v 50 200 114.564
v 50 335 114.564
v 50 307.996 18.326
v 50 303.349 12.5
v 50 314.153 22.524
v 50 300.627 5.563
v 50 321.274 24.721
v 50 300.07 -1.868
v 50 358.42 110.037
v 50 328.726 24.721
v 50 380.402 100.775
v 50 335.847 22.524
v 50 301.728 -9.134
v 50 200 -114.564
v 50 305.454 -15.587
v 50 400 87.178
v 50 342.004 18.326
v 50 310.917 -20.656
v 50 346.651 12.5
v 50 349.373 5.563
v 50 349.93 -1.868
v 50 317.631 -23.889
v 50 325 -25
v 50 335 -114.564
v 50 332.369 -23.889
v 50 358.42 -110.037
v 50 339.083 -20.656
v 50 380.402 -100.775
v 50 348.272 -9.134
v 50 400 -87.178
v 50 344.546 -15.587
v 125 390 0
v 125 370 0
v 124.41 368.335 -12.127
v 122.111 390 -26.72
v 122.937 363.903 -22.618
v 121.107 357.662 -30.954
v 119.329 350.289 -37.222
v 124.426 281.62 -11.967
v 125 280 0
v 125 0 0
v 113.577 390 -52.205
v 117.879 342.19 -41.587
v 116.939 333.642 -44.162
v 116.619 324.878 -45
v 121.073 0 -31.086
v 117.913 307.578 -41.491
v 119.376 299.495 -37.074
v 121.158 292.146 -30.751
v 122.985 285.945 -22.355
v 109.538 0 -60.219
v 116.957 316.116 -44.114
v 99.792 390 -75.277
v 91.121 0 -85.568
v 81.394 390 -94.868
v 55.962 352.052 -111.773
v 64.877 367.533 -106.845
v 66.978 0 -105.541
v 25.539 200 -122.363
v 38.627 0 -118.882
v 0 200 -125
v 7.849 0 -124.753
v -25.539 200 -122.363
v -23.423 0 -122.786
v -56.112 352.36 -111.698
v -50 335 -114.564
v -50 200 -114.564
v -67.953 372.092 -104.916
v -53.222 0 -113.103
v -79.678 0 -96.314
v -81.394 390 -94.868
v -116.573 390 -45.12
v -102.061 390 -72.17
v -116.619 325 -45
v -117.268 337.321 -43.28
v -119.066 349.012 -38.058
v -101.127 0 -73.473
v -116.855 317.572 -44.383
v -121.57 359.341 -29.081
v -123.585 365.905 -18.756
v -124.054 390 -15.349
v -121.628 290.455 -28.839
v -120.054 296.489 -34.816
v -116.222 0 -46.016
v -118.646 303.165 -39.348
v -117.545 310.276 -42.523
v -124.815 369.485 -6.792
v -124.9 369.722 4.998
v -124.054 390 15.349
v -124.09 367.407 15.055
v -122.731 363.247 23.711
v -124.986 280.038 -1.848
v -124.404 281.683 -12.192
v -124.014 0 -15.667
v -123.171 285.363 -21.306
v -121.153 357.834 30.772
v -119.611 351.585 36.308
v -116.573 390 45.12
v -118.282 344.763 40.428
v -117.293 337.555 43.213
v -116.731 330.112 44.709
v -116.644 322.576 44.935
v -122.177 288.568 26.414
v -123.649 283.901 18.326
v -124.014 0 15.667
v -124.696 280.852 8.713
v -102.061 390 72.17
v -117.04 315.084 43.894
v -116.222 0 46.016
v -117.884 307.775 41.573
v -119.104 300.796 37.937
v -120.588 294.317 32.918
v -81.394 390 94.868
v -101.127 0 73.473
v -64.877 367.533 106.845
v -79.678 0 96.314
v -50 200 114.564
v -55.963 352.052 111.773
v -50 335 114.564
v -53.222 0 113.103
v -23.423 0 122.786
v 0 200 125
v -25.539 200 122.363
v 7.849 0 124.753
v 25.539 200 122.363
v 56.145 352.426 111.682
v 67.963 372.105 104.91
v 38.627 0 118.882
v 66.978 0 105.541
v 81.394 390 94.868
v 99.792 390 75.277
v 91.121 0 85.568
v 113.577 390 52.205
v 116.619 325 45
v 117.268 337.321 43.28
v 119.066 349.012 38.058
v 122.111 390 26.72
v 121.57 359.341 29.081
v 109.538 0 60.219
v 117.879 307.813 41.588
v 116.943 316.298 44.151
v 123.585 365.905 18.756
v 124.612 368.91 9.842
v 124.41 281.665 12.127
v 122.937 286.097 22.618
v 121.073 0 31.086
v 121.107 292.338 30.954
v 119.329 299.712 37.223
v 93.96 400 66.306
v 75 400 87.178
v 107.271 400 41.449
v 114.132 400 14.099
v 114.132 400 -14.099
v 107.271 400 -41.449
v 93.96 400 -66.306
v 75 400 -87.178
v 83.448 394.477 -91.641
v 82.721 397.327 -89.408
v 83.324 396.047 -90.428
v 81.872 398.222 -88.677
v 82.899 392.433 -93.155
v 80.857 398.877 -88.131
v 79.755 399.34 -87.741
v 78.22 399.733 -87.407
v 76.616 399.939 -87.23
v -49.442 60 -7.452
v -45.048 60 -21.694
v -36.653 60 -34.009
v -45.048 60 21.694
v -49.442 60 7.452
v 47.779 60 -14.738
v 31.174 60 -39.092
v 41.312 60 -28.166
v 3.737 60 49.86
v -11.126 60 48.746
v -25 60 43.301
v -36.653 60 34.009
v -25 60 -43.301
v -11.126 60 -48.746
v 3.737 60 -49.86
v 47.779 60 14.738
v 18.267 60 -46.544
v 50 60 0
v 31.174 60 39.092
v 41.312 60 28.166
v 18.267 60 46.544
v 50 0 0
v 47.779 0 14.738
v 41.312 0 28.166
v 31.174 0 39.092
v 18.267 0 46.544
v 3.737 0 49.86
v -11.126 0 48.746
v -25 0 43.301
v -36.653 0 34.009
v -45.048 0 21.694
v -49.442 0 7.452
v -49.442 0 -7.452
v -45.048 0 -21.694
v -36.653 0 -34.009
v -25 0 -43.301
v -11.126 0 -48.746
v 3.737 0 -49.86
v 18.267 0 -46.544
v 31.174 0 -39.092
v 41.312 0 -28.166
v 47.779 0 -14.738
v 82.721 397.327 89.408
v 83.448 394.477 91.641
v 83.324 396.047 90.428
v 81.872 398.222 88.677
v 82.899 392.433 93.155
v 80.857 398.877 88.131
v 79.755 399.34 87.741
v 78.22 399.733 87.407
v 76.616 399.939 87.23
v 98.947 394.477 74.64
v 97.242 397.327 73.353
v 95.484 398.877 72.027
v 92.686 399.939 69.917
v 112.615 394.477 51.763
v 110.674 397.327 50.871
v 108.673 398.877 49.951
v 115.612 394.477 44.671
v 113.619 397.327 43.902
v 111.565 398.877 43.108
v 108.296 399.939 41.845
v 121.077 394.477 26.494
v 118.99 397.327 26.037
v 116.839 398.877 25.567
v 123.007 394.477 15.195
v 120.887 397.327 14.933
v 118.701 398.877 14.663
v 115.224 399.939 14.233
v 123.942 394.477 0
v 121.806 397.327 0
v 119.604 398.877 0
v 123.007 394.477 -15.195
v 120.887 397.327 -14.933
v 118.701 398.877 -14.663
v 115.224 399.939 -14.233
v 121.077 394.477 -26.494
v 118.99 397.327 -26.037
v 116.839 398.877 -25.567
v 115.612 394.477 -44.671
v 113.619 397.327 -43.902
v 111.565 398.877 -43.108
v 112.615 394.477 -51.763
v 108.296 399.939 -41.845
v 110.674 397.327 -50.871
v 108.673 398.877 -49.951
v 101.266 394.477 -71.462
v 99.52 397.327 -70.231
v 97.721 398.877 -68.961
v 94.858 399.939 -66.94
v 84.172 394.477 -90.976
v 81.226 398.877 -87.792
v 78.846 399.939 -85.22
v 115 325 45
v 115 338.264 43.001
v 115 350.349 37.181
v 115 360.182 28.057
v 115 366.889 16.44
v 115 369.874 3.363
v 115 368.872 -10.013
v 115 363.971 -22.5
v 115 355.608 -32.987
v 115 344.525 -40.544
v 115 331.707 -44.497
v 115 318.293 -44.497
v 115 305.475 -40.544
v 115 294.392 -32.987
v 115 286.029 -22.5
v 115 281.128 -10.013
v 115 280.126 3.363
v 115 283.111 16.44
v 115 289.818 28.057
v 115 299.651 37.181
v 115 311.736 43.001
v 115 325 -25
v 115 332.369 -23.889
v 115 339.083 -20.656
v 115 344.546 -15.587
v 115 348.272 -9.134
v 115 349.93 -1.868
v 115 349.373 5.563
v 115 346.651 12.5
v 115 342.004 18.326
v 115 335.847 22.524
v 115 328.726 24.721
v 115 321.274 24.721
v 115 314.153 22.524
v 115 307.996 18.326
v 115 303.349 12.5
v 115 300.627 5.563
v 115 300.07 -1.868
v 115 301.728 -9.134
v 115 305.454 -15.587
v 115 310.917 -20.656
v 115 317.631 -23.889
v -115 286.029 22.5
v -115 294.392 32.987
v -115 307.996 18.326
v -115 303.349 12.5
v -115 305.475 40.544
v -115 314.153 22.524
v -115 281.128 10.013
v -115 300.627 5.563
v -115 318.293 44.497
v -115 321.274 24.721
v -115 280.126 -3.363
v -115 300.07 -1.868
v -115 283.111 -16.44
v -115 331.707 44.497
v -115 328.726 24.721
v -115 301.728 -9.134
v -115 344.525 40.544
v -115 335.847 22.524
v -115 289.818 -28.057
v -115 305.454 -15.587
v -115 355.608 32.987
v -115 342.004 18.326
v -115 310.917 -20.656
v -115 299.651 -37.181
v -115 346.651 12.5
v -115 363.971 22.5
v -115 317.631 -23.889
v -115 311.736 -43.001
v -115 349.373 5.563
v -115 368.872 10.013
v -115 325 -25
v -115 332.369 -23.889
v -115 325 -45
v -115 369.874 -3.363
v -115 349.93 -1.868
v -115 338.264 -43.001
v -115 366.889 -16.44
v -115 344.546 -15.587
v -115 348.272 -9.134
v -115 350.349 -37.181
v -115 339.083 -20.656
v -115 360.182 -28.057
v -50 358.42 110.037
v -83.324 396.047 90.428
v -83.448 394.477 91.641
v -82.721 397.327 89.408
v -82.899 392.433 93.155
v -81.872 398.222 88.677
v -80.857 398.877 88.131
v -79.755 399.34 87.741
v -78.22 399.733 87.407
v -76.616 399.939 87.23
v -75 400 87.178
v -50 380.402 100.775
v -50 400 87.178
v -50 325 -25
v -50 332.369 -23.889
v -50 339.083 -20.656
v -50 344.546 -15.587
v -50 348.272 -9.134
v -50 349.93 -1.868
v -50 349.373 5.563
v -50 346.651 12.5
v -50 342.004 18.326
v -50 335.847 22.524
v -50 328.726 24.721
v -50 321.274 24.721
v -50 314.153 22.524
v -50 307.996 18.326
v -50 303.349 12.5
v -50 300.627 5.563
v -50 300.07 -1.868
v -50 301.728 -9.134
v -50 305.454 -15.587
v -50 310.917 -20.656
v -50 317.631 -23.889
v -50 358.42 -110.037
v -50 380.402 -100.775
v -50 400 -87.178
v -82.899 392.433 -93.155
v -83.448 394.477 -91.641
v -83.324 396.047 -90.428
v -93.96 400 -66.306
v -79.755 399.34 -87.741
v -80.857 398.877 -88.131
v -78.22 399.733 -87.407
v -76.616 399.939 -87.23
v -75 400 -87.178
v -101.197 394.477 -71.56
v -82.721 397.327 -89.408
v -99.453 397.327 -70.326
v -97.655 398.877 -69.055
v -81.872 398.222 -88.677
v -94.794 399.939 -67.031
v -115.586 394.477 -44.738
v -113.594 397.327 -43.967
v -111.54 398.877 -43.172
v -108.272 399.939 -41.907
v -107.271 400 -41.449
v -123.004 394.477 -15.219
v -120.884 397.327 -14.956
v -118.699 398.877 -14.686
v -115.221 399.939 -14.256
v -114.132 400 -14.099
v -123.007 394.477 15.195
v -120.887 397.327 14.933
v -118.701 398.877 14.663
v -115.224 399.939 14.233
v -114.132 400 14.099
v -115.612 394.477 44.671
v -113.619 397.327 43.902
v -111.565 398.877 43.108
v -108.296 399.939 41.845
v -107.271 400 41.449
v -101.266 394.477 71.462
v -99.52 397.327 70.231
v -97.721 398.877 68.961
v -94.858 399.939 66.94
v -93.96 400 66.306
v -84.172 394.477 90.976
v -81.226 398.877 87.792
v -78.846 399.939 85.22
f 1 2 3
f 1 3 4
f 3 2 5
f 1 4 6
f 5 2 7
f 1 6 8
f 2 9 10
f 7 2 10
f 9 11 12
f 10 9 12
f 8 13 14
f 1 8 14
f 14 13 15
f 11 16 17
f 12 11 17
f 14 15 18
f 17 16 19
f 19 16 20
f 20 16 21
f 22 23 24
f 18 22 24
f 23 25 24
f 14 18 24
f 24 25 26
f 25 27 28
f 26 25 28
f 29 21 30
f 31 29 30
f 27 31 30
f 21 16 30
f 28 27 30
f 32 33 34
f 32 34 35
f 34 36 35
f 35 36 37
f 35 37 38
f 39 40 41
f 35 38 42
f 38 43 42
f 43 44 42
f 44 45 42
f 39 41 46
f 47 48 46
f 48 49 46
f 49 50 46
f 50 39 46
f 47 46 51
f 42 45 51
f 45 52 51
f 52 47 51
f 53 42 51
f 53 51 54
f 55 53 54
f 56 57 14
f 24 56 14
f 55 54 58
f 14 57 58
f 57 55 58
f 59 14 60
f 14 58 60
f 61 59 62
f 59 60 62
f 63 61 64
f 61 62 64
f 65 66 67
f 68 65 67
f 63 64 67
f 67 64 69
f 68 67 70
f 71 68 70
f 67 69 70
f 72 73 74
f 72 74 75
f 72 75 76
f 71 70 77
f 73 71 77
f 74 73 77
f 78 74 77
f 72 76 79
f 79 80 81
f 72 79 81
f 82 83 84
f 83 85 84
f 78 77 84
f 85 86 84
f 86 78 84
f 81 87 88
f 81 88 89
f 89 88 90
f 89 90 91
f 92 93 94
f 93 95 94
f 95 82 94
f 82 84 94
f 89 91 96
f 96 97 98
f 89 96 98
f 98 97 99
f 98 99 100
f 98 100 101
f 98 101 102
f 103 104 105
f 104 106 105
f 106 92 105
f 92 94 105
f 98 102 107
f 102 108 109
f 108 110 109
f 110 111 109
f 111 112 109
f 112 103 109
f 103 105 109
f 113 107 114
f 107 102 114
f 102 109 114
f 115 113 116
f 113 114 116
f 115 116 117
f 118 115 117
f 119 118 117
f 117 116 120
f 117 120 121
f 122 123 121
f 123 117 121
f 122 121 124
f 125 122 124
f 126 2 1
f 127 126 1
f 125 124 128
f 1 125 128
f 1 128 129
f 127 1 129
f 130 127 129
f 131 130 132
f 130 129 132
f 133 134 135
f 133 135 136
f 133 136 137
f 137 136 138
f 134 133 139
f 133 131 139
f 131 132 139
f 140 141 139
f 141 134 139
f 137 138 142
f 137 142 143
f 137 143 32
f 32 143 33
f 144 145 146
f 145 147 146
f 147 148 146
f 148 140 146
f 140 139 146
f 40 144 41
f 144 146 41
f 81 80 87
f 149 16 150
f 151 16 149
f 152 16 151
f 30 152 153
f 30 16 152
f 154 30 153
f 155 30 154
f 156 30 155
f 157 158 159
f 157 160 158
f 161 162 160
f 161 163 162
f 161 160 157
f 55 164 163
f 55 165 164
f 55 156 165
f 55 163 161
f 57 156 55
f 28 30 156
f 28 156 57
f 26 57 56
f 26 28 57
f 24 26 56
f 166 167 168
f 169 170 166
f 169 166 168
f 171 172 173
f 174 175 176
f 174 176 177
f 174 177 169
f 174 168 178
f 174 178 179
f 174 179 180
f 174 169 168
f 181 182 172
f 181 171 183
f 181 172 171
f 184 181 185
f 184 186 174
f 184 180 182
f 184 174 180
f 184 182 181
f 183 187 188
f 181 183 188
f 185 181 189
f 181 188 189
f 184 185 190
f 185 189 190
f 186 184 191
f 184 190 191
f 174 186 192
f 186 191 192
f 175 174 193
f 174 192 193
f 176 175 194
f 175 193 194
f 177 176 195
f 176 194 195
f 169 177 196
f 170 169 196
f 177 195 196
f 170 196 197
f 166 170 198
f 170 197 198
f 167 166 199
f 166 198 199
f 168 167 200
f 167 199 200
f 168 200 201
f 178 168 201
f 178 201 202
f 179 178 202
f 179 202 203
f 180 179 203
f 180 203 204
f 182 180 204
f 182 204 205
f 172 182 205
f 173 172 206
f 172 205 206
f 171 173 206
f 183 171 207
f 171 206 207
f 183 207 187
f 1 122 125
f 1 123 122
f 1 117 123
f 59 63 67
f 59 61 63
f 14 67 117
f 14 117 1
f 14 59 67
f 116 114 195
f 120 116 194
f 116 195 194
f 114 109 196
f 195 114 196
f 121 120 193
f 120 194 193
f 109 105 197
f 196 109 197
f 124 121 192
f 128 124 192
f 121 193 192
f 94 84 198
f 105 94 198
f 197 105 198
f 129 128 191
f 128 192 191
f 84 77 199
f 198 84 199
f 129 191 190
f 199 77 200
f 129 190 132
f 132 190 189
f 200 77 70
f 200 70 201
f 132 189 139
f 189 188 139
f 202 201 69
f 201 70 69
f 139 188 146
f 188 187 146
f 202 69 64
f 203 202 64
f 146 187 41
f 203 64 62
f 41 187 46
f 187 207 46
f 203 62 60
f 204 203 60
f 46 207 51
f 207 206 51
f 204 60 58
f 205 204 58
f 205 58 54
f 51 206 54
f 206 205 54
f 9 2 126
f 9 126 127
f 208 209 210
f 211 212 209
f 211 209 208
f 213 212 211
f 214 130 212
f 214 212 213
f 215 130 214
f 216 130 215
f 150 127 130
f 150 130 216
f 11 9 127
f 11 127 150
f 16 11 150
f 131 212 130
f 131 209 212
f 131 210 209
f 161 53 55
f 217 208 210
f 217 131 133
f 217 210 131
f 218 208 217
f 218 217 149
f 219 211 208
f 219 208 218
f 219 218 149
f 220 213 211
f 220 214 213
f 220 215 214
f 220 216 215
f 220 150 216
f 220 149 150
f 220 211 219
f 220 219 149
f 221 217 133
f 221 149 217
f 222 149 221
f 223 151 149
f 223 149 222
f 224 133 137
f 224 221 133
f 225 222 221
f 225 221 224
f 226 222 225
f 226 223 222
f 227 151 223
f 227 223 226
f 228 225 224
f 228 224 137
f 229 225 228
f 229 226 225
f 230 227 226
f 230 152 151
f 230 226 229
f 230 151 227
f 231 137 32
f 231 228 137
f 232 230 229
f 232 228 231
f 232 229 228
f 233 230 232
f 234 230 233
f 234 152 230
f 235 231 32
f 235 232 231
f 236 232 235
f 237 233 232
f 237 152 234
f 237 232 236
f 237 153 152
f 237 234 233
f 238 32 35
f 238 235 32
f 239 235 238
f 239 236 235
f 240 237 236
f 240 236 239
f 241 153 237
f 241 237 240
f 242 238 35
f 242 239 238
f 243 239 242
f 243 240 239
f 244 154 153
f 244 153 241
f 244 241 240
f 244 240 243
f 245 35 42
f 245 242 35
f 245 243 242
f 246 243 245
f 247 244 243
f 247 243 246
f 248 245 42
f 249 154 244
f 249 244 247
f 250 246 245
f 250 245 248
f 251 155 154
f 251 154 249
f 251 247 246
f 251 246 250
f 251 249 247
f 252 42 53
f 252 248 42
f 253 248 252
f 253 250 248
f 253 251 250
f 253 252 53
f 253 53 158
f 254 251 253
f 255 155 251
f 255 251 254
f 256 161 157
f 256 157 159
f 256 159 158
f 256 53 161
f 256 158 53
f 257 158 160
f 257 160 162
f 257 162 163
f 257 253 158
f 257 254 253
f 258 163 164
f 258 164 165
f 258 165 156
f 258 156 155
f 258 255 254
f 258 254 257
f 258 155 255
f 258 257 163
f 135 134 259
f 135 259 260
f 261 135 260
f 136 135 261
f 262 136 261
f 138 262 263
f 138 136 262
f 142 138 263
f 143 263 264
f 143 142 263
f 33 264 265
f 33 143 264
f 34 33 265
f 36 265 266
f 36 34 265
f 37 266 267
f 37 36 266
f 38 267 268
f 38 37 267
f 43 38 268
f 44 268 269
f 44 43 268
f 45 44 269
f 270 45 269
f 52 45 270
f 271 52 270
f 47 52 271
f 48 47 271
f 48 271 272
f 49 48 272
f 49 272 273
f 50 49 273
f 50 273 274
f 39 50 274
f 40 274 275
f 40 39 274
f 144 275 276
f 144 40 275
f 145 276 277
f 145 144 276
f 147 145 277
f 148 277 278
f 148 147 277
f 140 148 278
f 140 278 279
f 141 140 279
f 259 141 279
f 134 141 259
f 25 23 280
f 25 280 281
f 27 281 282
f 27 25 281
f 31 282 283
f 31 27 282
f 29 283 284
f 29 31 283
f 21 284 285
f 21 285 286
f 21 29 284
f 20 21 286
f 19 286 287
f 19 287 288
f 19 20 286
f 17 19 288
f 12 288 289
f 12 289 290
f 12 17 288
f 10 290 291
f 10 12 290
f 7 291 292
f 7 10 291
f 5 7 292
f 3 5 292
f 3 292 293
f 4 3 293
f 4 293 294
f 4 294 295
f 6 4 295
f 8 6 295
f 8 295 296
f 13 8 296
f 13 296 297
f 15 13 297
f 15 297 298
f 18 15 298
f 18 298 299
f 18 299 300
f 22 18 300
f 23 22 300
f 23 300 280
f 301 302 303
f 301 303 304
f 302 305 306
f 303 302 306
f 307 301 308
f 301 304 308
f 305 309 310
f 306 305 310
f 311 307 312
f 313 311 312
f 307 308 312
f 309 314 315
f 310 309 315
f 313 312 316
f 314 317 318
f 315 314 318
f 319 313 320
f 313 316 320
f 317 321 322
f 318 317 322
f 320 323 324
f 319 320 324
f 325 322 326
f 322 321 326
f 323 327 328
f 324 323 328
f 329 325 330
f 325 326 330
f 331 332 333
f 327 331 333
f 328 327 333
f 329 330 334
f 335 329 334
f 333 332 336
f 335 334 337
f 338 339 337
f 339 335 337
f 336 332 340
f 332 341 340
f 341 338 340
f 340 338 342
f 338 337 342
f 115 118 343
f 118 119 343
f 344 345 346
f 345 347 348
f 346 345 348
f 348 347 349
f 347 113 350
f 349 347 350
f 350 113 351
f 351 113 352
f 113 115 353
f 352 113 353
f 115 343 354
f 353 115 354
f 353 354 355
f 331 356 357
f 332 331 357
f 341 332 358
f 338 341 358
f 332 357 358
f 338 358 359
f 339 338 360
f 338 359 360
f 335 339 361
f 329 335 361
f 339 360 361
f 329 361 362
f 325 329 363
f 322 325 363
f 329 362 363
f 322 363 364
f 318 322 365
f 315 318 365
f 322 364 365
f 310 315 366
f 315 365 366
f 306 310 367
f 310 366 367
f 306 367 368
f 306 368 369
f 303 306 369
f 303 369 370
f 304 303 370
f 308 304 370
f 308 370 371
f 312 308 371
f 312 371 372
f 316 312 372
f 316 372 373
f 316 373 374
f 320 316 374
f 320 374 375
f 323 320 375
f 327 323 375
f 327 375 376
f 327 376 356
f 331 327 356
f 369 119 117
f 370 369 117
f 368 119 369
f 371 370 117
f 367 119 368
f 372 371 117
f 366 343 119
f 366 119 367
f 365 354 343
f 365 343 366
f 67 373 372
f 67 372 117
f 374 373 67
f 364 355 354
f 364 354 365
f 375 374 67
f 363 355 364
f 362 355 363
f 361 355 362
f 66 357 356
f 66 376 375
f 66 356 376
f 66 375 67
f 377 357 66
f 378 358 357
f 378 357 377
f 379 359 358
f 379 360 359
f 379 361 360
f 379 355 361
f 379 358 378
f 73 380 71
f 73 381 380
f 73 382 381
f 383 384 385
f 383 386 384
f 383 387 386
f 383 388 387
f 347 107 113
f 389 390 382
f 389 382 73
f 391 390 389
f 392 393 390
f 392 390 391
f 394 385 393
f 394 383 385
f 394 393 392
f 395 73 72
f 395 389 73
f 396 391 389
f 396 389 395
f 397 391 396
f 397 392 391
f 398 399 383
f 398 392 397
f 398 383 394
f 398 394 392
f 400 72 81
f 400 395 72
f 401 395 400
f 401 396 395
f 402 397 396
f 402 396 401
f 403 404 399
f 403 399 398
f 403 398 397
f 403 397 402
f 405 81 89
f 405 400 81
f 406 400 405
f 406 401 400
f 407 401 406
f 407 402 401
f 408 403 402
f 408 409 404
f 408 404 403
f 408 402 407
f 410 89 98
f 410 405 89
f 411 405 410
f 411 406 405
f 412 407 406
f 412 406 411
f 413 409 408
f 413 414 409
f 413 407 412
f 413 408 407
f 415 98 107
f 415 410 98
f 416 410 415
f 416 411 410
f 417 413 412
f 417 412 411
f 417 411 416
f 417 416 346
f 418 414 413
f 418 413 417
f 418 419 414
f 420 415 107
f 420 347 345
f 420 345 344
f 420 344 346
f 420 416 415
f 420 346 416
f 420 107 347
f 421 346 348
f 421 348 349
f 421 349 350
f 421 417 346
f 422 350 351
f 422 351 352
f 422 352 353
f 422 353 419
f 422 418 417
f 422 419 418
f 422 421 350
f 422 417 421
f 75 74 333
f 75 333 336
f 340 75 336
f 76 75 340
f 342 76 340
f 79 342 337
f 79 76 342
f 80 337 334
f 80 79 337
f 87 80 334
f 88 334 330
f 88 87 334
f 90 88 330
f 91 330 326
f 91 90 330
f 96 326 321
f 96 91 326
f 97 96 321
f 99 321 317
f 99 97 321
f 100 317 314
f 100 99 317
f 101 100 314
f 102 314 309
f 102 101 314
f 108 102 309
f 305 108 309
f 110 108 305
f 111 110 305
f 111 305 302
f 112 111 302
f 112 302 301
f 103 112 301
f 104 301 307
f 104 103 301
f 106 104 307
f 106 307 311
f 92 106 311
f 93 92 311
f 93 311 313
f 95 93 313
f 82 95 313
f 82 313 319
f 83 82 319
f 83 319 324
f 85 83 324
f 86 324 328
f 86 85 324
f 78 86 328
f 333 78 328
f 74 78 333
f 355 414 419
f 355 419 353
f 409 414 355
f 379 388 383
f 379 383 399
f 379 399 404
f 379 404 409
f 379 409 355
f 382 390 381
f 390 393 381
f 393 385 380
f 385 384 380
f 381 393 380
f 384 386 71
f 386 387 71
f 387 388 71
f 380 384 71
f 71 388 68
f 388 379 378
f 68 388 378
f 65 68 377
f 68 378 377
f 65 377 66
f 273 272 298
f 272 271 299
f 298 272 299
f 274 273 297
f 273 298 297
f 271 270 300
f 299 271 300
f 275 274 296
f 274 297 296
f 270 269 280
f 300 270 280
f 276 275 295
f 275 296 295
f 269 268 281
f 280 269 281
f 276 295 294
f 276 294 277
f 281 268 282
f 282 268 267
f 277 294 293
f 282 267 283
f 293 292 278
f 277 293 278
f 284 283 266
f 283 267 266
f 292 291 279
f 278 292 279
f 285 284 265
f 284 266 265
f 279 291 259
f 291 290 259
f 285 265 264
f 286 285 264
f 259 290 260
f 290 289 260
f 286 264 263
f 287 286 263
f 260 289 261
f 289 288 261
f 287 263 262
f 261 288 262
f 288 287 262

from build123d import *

# Parameters (mm, degrees)
SKETCH1_R               = 125
BOSS_EXTRUDE1_DEPTH     = 400
SKETCH2_W               = 100
SKETCH2_H               = 250
CUT_EXTRUDE1_DEPTH      = 200
SKETCH4_R               = 50
CUT_EXTRUDE3_DEPTH      = 60
SKETCH7_R               = 25
CUT_EXTRUDE6_DEPTH      = 176
CUT_EXTRUDE6_DEPTH_BACK = 76
FILLET2_R               = 10
SKETCH8_R               = 45
SKETCH8_R_2             = 25
CUT_EXTRUDE7_DEPTH      = 10
SKETCH10_R              = 45
SKETCH10_R_2            = 25
CUT_EXTRUDE8_DEPTH      = 10


with BuildPart() as part:
    # Sketch1 → Boss-Extrude1 (new body)
    with BuildSketch(Plane(origin=(0, 0, 0), x_dir=(1, 0, 0), z_dir=(0, 1, 0))):
        Circle(SKETCH1_R)
    extrude(amount=BOSS_EXTRUDE1_DEPTH)

    # Sketch2 → Cut-Extrude1 (cut)
    with BuildSketch(Plane(origin=(0, 400, 0), x_dir=(1, 0, 0), z_dir=(0, 1, 0))):
        Rectangle(SKETCH2_W, SKETCH2_H)
    extrude(amount=-CUT_EXTRUDE1_DEPTH, mode=Mode.SUBTRACT)

    # Sketch4 → Cut-Extrude3 (cut)
    with BuildSketch(Plane.XZ):
        Circle(SKETCH4_R)
    extrude(amount=-CUT_EXTRUDE3_DEPTH, mode=Mode.SUBTRACT)

    # Sketch7 → Cut-Extrude6 (cut, two sides)
    with BuildSketch(Plane(origin=(-50, 0, 0), x_dir=(0, 0, -1), z_dir=(1, 0, 0))) as cut_extrude6_sk:
        with BuildLine():
            Line((-87.177978871, 400), (-114.564392374, 400))
            Line((-114.564392374, 400), (-114.564392374, 335))
            ThreePointArc((-114.564392374, 335), (-105.977573518, 369.651471545), (-87.177978871, 400))
        make_face()
        with BuildLine():
            ThreePointArc((87.177978871, 400), (105.977573518, 369.651471545), (114.564392374, 335))
            Line((114.564392374, 335), (114.564392374, 400))
            Line((114.564392374, 400), (87.177978871, 400))
        make_face()
        with Locations((0, 325)):
            Circle(SKETCH7_R)
    extrude(amount=CUT_EXTRUDE6_DEPTH, mode=Mode.SUBTRACT)
    extrude(cut_extrude6_sk.sketch, amount=-CUT_EXTRUDE6_DEPTH_BACK, mode=Mode.SUBTRACT)

    # Fillet2
    fillet2_edges = [part.edges().sort_by_distance(p)[0] for p in [
        (115.807589436, 400, 47.048934409),
        (-125, 400, 0),
    ]]
    fillet(fillet2_edges, radius=FILLET2_R)

    # Sketch8 → Cut-Extrude7 (cut)
    with BuildSketch(Plane(origin=(-125, 0, 0), x_dir=(0, 0, -1), z_dir=(1, 0, 0))):
        with Locations((0, 325)):
            Circle(SKETCH8_R)
        with Locations((0, 325)):
            Circle(SKETCH8_R_2, mode=Mode.SUBTRACT)
    extrude(amount=CUT_EXTRUDE7_DEPTH, mode=Mode.SUBTRACT)

    # Sketch10 → Cut-Extrude8 (cut)
    with BuildSketch(Plane.ZY.offset(-125)):
        with Locations((0, 325)):
            Circle(SKETCH10_R)
        with Locations((0, 325)):
            Circle(SKETCH10_R_2, mode=Mode.SUBTRACT)
    extrude(amount=CUT_EXTRUDE8_DEPTH, mode=Mode.SUBTRACT)


solid = part.part
